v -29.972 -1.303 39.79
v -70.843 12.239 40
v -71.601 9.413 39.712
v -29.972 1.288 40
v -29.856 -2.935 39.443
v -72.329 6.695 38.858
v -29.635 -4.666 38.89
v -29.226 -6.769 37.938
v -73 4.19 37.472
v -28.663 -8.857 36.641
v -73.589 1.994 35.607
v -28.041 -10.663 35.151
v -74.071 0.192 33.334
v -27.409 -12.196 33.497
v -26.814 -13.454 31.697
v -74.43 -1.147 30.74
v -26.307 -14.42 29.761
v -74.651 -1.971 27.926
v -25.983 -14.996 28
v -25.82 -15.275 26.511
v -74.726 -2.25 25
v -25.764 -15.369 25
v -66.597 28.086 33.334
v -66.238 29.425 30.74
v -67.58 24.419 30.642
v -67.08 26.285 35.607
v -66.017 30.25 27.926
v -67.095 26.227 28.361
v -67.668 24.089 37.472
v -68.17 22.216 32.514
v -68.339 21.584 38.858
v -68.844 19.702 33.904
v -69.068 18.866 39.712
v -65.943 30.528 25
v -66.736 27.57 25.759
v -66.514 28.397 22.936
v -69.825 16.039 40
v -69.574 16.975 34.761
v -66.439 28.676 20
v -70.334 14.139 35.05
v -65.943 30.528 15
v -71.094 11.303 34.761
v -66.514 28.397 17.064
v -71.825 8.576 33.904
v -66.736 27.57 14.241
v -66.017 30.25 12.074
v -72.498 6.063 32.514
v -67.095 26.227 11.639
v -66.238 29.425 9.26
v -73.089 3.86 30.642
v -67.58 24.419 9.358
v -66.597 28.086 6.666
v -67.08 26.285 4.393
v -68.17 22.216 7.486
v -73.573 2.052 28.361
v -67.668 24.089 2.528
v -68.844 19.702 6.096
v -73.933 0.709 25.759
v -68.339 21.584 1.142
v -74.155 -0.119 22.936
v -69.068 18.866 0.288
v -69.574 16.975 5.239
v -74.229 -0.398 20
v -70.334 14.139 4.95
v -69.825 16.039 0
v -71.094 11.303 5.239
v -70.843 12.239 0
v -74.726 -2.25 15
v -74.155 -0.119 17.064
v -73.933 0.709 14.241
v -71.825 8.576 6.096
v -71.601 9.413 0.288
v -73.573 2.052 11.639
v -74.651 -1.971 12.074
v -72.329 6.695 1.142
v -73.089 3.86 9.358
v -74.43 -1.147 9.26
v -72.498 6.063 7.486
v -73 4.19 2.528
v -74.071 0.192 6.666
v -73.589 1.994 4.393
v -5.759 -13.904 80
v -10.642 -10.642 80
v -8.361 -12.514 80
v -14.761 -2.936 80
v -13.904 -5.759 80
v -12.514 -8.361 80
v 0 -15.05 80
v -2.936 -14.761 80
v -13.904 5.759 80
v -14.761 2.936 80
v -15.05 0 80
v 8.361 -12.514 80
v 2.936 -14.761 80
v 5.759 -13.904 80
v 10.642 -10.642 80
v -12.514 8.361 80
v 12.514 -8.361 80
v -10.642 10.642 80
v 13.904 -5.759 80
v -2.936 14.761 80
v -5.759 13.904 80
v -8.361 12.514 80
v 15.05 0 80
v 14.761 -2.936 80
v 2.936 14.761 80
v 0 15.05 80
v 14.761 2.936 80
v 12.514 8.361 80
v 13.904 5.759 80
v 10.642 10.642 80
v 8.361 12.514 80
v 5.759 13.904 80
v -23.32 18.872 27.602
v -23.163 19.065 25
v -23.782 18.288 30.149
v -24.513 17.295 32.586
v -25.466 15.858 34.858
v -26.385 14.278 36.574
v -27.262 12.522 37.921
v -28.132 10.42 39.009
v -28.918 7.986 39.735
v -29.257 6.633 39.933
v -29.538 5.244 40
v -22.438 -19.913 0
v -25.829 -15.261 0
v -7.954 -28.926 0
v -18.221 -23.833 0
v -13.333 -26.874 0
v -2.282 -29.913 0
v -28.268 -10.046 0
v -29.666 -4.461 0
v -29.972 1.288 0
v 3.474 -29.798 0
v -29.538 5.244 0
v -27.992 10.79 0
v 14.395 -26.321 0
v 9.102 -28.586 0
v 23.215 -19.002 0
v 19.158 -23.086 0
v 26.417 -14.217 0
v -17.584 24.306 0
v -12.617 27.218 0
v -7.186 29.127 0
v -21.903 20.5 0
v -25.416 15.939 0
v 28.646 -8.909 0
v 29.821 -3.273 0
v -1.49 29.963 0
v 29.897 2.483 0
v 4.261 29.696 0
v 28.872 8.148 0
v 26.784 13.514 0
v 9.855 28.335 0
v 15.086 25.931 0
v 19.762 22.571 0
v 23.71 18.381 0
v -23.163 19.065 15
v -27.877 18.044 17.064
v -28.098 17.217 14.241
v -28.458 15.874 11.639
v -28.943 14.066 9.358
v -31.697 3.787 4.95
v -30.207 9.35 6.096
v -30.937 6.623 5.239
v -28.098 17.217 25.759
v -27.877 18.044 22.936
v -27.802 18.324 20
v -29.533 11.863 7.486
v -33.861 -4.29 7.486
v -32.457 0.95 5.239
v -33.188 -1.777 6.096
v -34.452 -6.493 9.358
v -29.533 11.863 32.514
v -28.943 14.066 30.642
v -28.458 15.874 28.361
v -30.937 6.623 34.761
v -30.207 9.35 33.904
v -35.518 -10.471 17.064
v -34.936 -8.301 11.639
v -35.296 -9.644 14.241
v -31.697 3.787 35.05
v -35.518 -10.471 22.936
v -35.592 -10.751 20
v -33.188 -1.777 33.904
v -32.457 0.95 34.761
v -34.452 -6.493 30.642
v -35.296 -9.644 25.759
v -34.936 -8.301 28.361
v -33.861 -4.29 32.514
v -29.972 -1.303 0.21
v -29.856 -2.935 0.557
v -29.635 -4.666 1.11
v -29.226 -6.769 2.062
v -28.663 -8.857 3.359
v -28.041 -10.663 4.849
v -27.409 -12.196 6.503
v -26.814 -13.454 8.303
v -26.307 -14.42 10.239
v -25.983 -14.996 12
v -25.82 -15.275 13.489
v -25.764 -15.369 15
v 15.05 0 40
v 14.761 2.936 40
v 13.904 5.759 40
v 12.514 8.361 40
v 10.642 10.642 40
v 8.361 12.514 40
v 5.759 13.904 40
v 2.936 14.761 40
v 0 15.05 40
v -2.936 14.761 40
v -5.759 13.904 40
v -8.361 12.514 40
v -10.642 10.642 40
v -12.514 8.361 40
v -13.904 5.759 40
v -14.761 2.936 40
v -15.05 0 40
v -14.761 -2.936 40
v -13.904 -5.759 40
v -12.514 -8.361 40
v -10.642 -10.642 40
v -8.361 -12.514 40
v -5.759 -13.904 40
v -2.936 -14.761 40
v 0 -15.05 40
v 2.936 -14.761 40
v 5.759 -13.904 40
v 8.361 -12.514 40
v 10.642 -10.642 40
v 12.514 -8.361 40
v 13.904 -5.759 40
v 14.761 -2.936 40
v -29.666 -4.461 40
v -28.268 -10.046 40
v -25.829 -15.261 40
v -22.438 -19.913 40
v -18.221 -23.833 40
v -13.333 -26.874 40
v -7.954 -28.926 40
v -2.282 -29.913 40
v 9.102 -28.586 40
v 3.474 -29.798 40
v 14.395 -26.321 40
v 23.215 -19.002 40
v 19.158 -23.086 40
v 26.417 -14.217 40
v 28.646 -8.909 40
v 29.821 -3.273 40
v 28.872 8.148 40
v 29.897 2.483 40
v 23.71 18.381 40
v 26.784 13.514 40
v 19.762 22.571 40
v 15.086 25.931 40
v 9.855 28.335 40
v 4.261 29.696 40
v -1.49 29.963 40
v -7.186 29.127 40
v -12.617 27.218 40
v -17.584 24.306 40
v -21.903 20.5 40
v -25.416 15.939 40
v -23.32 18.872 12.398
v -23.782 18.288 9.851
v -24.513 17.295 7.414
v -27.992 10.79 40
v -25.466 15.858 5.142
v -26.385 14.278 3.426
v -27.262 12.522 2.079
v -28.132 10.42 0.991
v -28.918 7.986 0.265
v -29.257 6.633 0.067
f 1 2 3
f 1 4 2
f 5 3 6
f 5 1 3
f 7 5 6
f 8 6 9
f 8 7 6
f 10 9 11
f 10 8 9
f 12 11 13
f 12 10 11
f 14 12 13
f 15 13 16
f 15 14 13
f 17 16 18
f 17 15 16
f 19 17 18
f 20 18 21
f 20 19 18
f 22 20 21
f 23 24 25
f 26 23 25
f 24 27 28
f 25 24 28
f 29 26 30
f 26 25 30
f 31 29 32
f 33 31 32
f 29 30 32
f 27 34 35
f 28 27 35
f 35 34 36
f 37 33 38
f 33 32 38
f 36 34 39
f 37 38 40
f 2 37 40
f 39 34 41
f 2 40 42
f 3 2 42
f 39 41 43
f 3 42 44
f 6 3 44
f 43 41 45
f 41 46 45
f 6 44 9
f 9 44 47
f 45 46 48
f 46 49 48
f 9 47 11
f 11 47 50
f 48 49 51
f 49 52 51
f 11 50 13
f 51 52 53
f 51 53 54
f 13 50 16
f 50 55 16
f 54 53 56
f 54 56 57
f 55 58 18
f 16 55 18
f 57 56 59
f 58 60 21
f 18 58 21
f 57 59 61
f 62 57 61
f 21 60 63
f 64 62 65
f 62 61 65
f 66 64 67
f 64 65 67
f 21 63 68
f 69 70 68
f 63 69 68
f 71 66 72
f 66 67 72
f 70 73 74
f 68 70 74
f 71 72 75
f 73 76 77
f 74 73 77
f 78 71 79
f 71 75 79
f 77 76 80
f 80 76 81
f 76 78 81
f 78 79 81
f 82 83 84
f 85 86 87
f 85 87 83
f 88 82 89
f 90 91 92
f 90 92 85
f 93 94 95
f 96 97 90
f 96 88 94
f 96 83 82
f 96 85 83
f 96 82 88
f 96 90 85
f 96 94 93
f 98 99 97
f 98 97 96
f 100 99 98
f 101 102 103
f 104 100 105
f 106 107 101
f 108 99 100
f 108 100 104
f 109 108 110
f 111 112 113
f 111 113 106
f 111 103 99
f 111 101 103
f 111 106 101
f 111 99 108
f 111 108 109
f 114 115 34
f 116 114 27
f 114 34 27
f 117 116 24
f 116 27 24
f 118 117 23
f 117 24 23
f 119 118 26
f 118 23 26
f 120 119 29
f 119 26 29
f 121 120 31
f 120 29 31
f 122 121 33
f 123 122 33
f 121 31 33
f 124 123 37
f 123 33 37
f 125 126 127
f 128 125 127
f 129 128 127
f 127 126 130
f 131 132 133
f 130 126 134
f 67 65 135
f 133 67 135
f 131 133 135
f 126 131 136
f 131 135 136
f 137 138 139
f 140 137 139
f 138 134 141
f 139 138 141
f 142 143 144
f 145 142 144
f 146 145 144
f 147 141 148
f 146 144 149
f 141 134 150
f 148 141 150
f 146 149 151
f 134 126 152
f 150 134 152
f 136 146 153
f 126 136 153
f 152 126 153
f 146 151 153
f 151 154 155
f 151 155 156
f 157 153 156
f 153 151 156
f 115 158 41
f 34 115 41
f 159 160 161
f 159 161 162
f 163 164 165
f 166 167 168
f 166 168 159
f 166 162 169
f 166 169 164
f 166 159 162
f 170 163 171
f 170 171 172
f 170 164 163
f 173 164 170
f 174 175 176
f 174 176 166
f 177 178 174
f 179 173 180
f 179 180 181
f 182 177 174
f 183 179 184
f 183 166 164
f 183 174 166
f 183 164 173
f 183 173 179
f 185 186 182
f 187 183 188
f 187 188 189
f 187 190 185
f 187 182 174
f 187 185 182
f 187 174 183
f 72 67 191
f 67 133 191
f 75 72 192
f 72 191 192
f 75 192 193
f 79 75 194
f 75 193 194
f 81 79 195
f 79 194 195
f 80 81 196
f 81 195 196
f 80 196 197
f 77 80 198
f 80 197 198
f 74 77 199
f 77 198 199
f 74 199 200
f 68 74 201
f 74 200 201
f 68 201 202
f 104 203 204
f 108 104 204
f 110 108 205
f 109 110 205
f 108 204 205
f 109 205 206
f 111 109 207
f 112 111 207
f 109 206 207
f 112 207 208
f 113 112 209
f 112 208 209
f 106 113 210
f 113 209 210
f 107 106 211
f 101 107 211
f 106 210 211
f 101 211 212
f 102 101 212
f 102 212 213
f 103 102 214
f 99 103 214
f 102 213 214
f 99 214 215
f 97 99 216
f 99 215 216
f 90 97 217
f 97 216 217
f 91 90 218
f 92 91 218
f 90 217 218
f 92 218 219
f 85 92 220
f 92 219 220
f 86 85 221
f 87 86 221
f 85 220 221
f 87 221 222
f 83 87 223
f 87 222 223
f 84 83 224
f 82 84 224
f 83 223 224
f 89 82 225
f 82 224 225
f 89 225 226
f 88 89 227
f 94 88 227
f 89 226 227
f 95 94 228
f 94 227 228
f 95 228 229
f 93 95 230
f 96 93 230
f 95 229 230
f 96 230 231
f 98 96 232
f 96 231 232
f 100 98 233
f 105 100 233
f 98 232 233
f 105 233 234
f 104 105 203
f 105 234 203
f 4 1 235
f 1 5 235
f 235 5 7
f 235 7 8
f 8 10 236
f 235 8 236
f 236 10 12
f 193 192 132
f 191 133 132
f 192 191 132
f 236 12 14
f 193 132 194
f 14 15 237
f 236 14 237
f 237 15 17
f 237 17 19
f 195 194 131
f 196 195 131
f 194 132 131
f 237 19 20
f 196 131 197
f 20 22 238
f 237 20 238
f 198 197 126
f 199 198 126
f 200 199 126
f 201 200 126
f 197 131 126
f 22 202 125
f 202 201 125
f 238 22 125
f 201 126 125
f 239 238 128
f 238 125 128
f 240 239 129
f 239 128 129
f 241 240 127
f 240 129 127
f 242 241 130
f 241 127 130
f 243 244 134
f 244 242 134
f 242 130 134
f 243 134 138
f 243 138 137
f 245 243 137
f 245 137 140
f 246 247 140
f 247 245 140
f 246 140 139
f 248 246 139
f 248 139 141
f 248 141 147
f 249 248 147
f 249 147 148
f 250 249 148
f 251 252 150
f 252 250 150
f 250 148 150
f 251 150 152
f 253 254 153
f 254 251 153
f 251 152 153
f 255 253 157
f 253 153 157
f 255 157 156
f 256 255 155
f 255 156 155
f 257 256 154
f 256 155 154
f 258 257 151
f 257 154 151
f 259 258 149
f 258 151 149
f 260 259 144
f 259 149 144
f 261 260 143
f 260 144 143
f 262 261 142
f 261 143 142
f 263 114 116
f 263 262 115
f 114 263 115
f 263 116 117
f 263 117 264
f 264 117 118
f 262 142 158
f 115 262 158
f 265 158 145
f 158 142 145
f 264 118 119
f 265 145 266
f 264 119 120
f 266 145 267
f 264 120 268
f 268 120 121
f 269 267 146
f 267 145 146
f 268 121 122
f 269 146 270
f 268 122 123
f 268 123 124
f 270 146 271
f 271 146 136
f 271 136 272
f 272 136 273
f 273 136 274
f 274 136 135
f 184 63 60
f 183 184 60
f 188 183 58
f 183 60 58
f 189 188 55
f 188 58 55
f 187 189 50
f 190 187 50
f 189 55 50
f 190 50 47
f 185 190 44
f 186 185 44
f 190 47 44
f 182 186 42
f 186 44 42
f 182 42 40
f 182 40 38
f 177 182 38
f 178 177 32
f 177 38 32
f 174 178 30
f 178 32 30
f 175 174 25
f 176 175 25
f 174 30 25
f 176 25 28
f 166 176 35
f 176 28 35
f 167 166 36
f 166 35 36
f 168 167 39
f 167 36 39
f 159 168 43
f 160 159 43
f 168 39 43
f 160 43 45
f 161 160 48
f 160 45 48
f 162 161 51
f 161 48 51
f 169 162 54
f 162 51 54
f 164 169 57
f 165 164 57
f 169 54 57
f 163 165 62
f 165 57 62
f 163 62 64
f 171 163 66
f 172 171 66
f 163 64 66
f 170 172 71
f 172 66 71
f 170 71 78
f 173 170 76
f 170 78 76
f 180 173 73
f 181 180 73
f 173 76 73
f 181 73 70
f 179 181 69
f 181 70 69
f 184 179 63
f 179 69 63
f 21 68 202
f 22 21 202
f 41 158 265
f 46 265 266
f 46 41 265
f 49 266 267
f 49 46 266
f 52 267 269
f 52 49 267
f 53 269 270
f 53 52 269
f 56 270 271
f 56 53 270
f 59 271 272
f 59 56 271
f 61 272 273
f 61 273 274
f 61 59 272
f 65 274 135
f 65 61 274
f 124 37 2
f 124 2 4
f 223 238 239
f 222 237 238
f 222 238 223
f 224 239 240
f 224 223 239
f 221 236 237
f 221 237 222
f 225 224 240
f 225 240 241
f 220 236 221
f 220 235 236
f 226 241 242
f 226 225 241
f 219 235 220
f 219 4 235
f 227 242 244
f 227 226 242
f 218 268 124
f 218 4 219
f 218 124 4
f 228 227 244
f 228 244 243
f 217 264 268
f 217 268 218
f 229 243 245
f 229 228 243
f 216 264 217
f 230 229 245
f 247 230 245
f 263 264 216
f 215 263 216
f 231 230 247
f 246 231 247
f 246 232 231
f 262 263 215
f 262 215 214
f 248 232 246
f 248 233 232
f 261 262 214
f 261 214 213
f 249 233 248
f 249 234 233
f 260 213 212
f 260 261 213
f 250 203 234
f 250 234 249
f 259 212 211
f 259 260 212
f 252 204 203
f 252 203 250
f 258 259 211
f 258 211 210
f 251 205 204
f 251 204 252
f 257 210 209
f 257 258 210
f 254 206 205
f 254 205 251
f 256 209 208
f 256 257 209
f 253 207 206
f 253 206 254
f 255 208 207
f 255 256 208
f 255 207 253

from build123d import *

# Parameters (mm, degrees)
BOSS_EXTRUDE1_DEPTH = 40
SKETCH2_R           = 15.05
CUT_EXTRUDE1_DEPTH  = 40
FILLET1_R           = 15
SKETCH3_R           = 15.05
BOSS_EXTRUDE2_DEPTH = 40


with BuildPart() as part:
    # Sketch1 → Boss-Extrude1 (new body)
    with BuildSketch(Plane.XY):
        with BuildLine():
            Line((-23.162738789, 19.065348982), (-65.942835362, 30.52824131))
            Line((-65.942835362, 30.52824131), (-74.725635473, -2.249614938))
            Line((-74.725635473, -2.249614938), (-25.7643439, -15.368753476))
            ThreePointArc((-25.7643439, -15.368753476), (29.91474065, -2.260153064), (-23.162738789, 19.065348982))
        make_face()
    extrude(amount=BOSS_EXTRUDE1_DEPTH)

    # Sketch2 → Cut-Extrude1 (cut)
    with BuildSketch(Plane(origin=(-69.157563319, 18.530713242, 0), x_dir=(0, 0, 1), z_dir=(-0.9659258262890691, 0.2588190451025179, 0))):
        with Locations((20, -4.546311876)):
            Circle(SKETCH2_R)
    extrude(amount=-CUT_EXTRUDE1_DEPTH, mode=Mode.SUBTRACT)

    # Fillet1
    fillet1_edges = [part.edges().sort_by_distance(p)[0] for p in [
        (-50.244989687, -8.809184207, 0),
        (-50.244989687, -8.809184207, 40),
        (-44.552787075, 24.796795146, 0),
        (-44.552787075, 24.796795146, 40),
    ]]
    fillet(fillet1_edges, radius=FILLET1_R)

    # Sketch3 → Boss-Extrude2 (add)
    with BuildSketch(Plane.XY.offset(40)):
        Circle(SKETCH3_R)
    extrude(amount=BOSS_EXTRUDE2_DEPTH)


solid = part.part
